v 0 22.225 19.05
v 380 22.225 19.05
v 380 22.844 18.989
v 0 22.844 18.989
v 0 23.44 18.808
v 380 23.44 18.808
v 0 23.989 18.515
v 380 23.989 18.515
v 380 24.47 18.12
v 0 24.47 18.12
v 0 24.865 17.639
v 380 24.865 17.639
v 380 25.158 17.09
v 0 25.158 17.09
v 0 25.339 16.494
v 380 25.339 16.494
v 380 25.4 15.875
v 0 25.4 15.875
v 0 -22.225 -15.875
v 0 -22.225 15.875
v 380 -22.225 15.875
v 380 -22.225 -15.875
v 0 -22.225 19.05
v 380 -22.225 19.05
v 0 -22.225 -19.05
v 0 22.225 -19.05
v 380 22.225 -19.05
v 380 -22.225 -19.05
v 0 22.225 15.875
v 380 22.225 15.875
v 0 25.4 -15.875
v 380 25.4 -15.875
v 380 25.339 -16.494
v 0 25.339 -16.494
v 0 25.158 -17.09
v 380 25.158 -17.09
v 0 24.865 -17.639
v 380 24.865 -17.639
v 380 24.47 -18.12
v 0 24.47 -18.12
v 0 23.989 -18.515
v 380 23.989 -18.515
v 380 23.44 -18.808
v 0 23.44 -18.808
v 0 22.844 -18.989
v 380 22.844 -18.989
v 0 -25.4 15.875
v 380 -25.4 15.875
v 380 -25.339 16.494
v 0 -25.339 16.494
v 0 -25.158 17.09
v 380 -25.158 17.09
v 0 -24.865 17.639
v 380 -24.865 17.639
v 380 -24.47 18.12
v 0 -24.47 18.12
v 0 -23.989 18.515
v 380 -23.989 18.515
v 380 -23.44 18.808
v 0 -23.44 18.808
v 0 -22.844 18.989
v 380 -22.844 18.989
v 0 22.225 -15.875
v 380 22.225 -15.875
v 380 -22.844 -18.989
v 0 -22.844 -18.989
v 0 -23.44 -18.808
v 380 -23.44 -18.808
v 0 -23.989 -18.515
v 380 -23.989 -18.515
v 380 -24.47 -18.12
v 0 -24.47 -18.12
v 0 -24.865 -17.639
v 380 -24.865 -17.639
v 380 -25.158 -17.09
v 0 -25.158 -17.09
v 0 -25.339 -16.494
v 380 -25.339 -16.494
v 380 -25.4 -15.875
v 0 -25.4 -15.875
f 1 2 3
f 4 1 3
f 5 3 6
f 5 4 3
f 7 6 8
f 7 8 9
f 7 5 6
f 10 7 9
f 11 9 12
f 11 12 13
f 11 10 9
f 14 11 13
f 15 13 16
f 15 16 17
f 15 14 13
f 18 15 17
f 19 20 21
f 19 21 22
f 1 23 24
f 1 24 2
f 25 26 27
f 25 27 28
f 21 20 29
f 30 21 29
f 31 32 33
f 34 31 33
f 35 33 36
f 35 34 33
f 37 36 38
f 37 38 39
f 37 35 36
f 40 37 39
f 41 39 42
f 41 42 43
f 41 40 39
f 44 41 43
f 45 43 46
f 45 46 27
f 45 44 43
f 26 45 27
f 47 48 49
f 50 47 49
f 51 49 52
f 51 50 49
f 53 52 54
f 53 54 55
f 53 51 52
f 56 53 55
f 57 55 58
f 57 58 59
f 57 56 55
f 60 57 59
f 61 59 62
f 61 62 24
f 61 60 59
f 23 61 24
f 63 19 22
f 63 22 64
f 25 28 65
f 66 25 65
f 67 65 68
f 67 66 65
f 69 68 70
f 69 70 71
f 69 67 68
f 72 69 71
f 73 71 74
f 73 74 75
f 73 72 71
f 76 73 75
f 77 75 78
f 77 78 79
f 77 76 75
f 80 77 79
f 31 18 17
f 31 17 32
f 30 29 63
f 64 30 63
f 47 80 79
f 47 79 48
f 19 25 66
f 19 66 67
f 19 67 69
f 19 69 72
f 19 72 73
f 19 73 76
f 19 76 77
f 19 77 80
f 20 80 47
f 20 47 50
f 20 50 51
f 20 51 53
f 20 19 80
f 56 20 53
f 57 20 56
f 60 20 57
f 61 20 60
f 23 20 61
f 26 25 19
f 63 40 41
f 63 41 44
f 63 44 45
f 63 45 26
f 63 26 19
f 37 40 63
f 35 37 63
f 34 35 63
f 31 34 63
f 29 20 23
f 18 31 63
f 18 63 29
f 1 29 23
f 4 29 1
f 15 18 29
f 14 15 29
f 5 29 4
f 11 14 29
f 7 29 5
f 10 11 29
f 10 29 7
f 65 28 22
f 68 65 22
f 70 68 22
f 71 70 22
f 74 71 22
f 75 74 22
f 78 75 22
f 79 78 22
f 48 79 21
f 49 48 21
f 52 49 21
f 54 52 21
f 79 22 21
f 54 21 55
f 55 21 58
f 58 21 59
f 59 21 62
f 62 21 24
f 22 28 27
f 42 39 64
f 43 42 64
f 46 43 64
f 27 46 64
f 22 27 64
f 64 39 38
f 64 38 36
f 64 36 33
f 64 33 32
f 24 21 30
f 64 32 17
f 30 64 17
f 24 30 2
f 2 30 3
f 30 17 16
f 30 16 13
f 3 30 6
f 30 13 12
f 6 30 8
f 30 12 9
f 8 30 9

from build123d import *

# Parameters (mm, degrees)
SKETCH1_W      = 31.75
SKETCH1_H      = 44.45
EXTRUDE1_DEPTH = 380


with BuildPart() as part:
    # Sketch1 → Extrude1 (new body)
    with BuildSketch(Plane(origin=(0, 0, 0), x_dir=(0, 0, -1), z_dir=(1, 0, 0))):
        with BuildLine():
            Line((-15.875, 25.4), (15.875, 25.4))
            ThreePointArc((15.875, 25.4), (18.12006403, 24.47006403), (19.05, 22.225))
            Line((19.05, 22.225), (19.05, -22.225))
            ThreePointArc((19.05, -22.225), (18.12006403, -24.47006403), (15.875, -25.4))
            Line((15.875, -25.4), (-15.875, -25.4))
            ThreePointArc((-15.875, -25.4), (-18.12006403, -24.47006403), (-19.05, -22.225))
            Line((-19.05, -22.225), (-19.05, 22.225))
            ThreePointArc((-19.05, 22.225), (-18.12006403, 24.47006403), (-15.875, 25.4))
        make_face()
        Rectangle(SKETCH1_W, SKETCH1_H, mode=Mode.SUBTRACT)
    extrude(amount=EXTRUDE1_DEPTH)


solid = part.part
